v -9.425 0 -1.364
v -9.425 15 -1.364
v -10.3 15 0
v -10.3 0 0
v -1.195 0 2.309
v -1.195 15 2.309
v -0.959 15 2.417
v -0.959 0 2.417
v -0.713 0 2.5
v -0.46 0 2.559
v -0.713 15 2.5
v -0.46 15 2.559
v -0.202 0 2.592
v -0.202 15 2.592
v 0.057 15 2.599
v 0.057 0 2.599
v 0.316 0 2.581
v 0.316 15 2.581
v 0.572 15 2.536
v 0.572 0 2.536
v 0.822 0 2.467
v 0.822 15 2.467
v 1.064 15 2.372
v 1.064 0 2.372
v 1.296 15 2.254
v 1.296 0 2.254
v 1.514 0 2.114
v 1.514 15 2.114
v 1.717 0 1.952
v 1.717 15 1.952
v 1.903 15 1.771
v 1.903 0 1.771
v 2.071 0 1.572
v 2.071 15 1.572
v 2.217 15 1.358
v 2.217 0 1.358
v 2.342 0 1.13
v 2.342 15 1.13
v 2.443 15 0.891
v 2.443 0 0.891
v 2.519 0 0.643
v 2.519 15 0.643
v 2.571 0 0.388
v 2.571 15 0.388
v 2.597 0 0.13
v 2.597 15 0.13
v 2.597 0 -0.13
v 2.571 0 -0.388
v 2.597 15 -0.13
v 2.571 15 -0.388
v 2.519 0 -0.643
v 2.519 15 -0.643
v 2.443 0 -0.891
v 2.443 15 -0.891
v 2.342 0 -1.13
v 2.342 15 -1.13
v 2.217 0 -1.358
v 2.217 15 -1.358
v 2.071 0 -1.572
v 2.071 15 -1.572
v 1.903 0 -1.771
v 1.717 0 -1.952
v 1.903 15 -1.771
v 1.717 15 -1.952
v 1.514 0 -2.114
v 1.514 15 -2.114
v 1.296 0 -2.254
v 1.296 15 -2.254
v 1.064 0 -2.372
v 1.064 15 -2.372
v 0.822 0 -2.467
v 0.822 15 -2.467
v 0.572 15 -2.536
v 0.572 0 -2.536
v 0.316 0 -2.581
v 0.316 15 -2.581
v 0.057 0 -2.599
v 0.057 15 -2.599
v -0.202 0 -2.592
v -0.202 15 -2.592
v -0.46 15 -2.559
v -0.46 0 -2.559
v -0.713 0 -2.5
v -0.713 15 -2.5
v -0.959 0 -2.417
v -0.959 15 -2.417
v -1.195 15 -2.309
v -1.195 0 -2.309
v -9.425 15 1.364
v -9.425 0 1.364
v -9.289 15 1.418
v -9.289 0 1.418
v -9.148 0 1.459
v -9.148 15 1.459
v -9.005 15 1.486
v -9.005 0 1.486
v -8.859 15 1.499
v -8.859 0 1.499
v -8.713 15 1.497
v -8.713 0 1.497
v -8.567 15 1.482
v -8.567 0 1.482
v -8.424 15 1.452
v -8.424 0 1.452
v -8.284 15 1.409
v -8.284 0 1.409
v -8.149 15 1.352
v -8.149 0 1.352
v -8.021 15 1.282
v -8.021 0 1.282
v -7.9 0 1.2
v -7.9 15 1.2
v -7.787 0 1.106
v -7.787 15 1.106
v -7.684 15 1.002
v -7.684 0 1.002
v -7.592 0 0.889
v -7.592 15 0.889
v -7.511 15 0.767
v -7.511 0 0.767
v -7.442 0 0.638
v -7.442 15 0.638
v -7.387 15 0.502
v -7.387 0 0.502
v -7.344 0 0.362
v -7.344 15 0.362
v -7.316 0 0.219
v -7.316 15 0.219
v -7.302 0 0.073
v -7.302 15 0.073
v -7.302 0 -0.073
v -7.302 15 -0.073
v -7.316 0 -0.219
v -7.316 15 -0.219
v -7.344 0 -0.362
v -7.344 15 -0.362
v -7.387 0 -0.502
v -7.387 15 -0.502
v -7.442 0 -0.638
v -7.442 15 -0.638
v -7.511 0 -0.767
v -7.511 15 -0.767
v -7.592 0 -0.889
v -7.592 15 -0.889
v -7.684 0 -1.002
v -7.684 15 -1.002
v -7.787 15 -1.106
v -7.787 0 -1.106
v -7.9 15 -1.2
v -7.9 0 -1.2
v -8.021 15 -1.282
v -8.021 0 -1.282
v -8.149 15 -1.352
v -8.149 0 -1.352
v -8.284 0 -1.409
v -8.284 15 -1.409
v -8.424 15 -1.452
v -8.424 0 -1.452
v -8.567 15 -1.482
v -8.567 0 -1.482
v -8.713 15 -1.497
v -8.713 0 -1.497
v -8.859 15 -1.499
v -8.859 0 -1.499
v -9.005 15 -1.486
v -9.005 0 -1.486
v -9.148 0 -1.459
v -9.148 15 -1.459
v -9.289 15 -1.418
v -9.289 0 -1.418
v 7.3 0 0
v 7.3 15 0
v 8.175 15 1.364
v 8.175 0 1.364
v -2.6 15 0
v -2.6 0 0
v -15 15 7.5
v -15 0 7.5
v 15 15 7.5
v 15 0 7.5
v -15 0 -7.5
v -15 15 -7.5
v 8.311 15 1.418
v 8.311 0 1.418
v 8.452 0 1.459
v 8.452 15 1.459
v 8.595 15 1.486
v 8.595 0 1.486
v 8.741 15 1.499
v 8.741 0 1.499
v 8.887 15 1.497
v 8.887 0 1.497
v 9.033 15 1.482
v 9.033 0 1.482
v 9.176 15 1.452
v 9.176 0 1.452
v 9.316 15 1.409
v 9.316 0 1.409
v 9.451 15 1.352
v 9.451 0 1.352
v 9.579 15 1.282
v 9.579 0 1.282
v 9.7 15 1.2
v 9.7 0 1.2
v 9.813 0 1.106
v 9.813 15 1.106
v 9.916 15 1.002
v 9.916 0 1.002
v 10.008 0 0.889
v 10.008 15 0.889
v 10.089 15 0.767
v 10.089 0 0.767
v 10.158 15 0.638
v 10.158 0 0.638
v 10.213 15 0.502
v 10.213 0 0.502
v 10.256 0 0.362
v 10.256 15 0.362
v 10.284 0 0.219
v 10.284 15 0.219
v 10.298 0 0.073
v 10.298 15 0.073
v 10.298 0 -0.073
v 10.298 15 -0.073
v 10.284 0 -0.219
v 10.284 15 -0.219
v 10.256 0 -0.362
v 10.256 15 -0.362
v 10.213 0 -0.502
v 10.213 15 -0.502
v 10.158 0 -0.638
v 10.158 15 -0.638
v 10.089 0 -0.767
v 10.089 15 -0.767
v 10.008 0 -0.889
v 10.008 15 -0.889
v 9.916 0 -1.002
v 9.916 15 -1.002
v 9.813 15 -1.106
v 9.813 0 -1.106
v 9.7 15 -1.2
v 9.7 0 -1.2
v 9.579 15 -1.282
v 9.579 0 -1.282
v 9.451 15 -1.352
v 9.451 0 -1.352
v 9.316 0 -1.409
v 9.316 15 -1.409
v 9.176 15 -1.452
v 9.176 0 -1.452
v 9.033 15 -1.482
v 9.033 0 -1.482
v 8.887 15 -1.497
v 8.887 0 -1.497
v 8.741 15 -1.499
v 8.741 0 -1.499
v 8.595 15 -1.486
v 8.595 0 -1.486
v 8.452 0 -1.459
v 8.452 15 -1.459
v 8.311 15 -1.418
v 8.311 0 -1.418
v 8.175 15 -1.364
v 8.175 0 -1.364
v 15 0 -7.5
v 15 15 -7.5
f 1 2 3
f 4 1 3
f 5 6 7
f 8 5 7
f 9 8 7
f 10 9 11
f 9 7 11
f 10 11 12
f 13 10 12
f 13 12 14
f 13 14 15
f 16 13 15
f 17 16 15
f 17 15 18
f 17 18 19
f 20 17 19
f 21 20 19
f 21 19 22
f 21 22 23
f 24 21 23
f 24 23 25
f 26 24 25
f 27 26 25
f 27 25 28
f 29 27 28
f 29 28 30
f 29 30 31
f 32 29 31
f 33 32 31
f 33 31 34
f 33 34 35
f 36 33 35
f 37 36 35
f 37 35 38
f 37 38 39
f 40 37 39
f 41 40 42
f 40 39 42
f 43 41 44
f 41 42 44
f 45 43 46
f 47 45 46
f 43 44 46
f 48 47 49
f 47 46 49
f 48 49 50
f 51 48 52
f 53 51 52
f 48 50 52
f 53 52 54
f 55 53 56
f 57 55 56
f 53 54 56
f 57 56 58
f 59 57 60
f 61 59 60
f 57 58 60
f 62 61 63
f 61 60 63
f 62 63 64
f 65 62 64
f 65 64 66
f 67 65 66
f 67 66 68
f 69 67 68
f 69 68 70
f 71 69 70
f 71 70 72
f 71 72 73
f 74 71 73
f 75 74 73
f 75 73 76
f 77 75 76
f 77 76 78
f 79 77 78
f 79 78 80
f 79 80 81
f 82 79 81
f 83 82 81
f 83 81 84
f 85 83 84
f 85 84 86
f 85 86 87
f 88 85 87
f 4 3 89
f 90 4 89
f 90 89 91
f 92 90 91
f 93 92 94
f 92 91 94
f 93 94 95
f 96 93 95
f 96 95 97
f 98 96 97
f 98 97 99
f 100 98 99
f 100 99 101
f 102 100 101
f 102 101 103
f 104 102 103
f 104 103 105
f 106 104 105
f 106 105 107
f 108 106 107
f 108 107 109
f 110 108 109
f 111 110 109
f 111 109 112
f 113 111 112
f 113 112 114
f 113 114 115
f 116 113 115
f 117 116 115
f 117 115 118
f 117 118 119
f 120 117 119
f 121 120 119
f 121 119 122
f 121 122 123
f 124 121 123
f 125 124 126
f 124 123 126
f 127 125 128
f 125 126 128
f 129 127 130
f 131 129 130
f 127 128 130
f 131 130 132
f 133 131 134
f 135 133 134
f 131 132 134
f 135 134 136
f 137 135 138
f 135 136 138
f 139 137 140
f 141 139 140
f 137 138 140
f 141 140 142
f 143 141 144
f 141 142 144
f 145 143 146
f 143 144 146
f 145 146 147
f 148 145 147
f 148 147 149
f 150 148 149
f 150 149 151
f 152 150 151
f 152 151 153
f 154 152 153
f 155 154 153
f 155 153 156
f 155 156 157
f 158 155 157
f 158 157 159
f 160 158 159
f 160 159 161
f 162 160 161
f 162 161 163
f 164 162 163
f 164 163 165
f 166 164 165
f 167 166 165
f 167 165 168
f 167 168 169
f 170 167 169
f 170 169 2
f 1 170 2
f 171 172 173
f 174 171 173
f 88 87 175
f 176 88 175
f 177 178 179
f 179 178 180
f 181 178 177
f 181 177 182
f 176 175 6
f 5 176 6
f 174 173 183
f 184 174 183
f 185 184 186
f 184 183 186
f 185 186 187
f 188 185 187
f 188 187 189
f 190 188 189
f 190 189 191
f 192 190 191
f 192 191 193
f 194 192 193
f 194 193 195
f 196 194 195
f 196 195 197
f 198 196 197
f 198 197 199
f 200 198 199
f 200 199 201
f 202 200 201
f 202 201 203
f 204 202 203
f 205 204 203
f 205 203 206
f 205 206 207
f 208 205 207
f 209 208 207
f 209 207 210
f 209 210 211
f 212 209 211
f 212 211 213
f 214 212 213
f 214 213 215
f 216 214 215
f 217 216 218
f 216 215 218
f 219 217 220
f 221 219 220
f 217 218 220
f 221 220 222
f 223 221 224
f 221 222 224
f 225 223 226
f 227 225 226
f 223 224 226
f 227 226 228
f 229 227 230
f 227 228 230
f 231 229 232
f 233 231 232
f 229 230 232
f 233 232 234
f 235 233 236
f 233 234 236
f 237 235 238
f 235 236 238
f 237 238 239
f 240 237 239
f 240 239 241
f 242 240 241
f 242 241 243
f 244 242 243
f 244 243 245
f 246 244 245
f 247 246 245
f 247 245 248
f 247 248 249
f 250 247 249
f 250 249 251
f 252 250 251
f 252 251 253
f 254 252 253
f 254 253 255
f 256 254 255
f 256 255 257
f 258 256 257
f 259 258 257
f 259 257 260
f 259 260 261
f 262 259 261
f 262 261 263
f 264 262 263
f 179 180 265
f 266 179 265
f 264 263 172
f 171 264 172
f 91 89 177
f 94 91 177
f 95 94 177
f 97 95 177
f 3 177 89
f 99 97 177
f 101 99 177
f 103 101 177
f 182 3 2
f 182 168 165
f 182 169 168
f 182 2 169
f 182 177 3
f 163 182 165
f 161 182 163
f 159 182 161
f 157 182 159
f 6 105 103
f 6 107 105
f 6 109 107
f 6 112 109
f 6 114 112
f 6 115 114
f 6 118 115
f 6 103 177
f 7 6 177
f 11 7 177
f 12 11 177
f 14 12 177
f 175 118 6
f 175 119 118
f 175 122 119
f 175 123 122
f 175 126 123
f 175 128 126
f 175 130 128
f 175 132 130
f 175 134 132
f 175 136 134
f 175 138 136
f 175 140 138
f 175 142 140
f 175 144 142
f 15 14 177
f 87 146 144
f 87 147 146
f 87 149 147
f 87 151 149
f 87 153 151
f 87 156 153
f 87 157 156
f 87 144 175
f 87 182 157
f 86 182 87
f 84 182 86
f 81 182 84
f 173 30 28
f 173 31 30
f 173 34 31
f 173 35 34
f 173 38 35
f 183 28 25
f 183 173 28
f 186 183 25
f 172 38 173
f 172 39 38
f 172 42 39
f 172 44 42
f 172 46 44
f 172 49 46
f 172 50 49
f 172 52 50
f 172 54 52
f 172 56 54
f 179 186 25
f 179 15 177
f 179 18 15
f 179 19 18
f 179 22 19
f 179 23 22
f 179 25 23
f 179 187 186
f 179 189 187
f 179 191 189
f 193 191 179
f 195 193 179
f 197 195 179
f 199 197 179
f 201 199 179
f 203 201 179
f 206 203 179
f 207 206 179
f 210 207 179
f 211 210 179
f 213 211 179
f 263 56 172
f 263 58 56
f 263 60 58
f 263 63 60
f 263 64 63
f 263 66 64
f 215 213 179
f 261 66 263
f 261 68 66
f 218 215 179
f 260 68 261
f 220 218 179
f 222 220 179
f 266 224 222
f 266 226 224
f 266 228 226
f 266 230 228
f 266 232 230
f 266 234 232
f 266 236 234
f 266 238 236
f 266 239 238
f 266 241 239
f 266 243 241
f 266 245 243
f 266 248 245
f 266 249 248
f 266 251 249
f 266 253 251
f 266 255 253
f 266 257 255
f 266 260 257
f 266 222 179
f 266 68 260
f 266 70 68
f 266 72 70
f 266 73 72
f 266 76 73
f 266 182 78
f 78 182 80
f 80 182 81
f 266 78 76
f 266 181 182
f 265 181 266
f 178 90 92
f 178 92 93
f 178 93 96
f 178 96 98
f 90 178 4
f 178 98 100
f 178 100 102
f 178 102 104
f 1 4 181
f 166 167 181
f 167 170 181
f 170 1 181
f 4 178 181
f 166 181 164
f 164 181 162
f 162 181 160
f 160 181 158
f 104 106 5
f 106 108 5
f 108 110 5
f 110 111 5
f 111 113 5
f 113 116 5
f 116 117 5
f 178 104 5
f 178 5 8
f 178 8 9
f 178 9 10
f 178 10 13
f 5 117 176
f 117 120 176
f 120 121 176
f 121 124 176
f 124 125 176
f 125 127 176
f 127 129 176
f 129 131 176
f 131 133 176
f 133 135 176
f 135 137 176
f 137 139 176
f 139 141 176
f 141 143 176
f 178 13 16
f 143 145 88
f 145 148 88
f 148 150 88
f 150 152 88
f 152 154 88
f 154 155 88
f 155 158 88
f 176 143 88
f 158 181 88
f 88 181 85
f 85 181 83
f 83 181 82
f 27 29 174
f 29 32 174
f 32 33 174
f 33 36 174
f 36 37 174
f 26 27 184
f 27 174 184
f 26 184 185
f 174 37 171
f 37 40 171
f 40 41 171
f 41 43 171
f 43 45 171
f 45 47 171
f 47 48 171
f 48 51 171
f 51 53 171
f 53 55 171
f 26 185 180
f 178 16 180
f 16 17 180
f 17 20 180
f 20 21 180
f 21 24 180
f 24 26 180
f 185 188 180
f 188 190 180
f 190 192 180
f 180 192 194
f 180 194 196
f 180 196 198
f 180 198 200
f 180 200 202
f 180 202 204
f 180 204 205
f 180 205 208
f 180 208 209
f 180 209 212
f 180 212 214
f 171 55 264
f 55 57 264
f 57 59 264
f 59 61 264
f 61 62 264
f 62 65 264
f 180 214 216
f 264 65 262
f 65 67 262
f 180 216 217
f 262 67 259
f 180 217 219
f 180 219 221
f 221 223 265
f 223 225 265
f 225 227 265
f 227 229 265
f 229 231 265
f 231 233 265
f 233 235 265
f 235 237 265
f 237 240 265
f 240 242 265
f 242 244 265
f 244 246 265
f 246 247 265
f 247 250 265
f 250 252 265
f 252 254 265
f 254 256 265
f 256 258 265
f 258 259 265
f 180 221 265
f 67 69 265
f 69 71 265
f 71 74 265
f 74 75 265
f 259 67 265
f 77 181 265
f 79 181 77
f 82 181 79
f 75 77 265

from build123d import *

# Parameters (mm, degrees)
SKETCH1_W           = 30
SKETCH1_H           = 15
BOSS_EXTRUDE1_DEPTH = 15
CUT_EXTRUDE1_DEPTH  = 23.5


with BuildPart() as part:
    # Sketch1 → Boss-Extrude1 (new body)
    with BuildSketch(Plane(origin=(0, 0, 0), x_dir=(1, 0, 0), z_dir=(0, 1, 0))):
        Rectangle(SKETCH1_W, SKETCH1_H)
    extrude(amount=BOSS_EXTRUDE1_DEPTH)

    # Sketch2 → Cut-Extrude1 (cut, through all)
    with BuildSketch(Plane(origin=(0, 15, 0), x_dir=(1, 0, 0), z_dir=(0, 1, 0))):
        with BuildLine():
            Line((-10.3, 0), (-9.424773748, -1.363692694))
            ThreePointArc((-9.424773748, -1.363692694), (-7.3, 0), (-9.424773748, 1.363692694))
            Line((-9.424773748, 1.363692694), (-10.3, 0))
        make_face()
        with BuildLine():
            Line((-2.6, 0), (-1.195098007, -2.309056248))
            ThreePointArc((-1.195098007, -2.309056248), (2.6, 0), (-1.195098007, 2.309056248))
            Line((-1.195098007, 2.309056248), (-2.6, 0))
        make_face()
        with BuildLine():
            Line((7.3, 0), (8.175226252, -1.363692694))
            ThreePointArc((8.175226252, -1.363692694), (10.3, 0), (8.175226252, 1.363692694))
            Line((8.175226252, 1.363692694), (7.3, 0))
        make_face()
    extrude(amount=-CUT_EXTRUDE1_DEPTH, mode=Mode.SUBTRACT)


solid = part.part
